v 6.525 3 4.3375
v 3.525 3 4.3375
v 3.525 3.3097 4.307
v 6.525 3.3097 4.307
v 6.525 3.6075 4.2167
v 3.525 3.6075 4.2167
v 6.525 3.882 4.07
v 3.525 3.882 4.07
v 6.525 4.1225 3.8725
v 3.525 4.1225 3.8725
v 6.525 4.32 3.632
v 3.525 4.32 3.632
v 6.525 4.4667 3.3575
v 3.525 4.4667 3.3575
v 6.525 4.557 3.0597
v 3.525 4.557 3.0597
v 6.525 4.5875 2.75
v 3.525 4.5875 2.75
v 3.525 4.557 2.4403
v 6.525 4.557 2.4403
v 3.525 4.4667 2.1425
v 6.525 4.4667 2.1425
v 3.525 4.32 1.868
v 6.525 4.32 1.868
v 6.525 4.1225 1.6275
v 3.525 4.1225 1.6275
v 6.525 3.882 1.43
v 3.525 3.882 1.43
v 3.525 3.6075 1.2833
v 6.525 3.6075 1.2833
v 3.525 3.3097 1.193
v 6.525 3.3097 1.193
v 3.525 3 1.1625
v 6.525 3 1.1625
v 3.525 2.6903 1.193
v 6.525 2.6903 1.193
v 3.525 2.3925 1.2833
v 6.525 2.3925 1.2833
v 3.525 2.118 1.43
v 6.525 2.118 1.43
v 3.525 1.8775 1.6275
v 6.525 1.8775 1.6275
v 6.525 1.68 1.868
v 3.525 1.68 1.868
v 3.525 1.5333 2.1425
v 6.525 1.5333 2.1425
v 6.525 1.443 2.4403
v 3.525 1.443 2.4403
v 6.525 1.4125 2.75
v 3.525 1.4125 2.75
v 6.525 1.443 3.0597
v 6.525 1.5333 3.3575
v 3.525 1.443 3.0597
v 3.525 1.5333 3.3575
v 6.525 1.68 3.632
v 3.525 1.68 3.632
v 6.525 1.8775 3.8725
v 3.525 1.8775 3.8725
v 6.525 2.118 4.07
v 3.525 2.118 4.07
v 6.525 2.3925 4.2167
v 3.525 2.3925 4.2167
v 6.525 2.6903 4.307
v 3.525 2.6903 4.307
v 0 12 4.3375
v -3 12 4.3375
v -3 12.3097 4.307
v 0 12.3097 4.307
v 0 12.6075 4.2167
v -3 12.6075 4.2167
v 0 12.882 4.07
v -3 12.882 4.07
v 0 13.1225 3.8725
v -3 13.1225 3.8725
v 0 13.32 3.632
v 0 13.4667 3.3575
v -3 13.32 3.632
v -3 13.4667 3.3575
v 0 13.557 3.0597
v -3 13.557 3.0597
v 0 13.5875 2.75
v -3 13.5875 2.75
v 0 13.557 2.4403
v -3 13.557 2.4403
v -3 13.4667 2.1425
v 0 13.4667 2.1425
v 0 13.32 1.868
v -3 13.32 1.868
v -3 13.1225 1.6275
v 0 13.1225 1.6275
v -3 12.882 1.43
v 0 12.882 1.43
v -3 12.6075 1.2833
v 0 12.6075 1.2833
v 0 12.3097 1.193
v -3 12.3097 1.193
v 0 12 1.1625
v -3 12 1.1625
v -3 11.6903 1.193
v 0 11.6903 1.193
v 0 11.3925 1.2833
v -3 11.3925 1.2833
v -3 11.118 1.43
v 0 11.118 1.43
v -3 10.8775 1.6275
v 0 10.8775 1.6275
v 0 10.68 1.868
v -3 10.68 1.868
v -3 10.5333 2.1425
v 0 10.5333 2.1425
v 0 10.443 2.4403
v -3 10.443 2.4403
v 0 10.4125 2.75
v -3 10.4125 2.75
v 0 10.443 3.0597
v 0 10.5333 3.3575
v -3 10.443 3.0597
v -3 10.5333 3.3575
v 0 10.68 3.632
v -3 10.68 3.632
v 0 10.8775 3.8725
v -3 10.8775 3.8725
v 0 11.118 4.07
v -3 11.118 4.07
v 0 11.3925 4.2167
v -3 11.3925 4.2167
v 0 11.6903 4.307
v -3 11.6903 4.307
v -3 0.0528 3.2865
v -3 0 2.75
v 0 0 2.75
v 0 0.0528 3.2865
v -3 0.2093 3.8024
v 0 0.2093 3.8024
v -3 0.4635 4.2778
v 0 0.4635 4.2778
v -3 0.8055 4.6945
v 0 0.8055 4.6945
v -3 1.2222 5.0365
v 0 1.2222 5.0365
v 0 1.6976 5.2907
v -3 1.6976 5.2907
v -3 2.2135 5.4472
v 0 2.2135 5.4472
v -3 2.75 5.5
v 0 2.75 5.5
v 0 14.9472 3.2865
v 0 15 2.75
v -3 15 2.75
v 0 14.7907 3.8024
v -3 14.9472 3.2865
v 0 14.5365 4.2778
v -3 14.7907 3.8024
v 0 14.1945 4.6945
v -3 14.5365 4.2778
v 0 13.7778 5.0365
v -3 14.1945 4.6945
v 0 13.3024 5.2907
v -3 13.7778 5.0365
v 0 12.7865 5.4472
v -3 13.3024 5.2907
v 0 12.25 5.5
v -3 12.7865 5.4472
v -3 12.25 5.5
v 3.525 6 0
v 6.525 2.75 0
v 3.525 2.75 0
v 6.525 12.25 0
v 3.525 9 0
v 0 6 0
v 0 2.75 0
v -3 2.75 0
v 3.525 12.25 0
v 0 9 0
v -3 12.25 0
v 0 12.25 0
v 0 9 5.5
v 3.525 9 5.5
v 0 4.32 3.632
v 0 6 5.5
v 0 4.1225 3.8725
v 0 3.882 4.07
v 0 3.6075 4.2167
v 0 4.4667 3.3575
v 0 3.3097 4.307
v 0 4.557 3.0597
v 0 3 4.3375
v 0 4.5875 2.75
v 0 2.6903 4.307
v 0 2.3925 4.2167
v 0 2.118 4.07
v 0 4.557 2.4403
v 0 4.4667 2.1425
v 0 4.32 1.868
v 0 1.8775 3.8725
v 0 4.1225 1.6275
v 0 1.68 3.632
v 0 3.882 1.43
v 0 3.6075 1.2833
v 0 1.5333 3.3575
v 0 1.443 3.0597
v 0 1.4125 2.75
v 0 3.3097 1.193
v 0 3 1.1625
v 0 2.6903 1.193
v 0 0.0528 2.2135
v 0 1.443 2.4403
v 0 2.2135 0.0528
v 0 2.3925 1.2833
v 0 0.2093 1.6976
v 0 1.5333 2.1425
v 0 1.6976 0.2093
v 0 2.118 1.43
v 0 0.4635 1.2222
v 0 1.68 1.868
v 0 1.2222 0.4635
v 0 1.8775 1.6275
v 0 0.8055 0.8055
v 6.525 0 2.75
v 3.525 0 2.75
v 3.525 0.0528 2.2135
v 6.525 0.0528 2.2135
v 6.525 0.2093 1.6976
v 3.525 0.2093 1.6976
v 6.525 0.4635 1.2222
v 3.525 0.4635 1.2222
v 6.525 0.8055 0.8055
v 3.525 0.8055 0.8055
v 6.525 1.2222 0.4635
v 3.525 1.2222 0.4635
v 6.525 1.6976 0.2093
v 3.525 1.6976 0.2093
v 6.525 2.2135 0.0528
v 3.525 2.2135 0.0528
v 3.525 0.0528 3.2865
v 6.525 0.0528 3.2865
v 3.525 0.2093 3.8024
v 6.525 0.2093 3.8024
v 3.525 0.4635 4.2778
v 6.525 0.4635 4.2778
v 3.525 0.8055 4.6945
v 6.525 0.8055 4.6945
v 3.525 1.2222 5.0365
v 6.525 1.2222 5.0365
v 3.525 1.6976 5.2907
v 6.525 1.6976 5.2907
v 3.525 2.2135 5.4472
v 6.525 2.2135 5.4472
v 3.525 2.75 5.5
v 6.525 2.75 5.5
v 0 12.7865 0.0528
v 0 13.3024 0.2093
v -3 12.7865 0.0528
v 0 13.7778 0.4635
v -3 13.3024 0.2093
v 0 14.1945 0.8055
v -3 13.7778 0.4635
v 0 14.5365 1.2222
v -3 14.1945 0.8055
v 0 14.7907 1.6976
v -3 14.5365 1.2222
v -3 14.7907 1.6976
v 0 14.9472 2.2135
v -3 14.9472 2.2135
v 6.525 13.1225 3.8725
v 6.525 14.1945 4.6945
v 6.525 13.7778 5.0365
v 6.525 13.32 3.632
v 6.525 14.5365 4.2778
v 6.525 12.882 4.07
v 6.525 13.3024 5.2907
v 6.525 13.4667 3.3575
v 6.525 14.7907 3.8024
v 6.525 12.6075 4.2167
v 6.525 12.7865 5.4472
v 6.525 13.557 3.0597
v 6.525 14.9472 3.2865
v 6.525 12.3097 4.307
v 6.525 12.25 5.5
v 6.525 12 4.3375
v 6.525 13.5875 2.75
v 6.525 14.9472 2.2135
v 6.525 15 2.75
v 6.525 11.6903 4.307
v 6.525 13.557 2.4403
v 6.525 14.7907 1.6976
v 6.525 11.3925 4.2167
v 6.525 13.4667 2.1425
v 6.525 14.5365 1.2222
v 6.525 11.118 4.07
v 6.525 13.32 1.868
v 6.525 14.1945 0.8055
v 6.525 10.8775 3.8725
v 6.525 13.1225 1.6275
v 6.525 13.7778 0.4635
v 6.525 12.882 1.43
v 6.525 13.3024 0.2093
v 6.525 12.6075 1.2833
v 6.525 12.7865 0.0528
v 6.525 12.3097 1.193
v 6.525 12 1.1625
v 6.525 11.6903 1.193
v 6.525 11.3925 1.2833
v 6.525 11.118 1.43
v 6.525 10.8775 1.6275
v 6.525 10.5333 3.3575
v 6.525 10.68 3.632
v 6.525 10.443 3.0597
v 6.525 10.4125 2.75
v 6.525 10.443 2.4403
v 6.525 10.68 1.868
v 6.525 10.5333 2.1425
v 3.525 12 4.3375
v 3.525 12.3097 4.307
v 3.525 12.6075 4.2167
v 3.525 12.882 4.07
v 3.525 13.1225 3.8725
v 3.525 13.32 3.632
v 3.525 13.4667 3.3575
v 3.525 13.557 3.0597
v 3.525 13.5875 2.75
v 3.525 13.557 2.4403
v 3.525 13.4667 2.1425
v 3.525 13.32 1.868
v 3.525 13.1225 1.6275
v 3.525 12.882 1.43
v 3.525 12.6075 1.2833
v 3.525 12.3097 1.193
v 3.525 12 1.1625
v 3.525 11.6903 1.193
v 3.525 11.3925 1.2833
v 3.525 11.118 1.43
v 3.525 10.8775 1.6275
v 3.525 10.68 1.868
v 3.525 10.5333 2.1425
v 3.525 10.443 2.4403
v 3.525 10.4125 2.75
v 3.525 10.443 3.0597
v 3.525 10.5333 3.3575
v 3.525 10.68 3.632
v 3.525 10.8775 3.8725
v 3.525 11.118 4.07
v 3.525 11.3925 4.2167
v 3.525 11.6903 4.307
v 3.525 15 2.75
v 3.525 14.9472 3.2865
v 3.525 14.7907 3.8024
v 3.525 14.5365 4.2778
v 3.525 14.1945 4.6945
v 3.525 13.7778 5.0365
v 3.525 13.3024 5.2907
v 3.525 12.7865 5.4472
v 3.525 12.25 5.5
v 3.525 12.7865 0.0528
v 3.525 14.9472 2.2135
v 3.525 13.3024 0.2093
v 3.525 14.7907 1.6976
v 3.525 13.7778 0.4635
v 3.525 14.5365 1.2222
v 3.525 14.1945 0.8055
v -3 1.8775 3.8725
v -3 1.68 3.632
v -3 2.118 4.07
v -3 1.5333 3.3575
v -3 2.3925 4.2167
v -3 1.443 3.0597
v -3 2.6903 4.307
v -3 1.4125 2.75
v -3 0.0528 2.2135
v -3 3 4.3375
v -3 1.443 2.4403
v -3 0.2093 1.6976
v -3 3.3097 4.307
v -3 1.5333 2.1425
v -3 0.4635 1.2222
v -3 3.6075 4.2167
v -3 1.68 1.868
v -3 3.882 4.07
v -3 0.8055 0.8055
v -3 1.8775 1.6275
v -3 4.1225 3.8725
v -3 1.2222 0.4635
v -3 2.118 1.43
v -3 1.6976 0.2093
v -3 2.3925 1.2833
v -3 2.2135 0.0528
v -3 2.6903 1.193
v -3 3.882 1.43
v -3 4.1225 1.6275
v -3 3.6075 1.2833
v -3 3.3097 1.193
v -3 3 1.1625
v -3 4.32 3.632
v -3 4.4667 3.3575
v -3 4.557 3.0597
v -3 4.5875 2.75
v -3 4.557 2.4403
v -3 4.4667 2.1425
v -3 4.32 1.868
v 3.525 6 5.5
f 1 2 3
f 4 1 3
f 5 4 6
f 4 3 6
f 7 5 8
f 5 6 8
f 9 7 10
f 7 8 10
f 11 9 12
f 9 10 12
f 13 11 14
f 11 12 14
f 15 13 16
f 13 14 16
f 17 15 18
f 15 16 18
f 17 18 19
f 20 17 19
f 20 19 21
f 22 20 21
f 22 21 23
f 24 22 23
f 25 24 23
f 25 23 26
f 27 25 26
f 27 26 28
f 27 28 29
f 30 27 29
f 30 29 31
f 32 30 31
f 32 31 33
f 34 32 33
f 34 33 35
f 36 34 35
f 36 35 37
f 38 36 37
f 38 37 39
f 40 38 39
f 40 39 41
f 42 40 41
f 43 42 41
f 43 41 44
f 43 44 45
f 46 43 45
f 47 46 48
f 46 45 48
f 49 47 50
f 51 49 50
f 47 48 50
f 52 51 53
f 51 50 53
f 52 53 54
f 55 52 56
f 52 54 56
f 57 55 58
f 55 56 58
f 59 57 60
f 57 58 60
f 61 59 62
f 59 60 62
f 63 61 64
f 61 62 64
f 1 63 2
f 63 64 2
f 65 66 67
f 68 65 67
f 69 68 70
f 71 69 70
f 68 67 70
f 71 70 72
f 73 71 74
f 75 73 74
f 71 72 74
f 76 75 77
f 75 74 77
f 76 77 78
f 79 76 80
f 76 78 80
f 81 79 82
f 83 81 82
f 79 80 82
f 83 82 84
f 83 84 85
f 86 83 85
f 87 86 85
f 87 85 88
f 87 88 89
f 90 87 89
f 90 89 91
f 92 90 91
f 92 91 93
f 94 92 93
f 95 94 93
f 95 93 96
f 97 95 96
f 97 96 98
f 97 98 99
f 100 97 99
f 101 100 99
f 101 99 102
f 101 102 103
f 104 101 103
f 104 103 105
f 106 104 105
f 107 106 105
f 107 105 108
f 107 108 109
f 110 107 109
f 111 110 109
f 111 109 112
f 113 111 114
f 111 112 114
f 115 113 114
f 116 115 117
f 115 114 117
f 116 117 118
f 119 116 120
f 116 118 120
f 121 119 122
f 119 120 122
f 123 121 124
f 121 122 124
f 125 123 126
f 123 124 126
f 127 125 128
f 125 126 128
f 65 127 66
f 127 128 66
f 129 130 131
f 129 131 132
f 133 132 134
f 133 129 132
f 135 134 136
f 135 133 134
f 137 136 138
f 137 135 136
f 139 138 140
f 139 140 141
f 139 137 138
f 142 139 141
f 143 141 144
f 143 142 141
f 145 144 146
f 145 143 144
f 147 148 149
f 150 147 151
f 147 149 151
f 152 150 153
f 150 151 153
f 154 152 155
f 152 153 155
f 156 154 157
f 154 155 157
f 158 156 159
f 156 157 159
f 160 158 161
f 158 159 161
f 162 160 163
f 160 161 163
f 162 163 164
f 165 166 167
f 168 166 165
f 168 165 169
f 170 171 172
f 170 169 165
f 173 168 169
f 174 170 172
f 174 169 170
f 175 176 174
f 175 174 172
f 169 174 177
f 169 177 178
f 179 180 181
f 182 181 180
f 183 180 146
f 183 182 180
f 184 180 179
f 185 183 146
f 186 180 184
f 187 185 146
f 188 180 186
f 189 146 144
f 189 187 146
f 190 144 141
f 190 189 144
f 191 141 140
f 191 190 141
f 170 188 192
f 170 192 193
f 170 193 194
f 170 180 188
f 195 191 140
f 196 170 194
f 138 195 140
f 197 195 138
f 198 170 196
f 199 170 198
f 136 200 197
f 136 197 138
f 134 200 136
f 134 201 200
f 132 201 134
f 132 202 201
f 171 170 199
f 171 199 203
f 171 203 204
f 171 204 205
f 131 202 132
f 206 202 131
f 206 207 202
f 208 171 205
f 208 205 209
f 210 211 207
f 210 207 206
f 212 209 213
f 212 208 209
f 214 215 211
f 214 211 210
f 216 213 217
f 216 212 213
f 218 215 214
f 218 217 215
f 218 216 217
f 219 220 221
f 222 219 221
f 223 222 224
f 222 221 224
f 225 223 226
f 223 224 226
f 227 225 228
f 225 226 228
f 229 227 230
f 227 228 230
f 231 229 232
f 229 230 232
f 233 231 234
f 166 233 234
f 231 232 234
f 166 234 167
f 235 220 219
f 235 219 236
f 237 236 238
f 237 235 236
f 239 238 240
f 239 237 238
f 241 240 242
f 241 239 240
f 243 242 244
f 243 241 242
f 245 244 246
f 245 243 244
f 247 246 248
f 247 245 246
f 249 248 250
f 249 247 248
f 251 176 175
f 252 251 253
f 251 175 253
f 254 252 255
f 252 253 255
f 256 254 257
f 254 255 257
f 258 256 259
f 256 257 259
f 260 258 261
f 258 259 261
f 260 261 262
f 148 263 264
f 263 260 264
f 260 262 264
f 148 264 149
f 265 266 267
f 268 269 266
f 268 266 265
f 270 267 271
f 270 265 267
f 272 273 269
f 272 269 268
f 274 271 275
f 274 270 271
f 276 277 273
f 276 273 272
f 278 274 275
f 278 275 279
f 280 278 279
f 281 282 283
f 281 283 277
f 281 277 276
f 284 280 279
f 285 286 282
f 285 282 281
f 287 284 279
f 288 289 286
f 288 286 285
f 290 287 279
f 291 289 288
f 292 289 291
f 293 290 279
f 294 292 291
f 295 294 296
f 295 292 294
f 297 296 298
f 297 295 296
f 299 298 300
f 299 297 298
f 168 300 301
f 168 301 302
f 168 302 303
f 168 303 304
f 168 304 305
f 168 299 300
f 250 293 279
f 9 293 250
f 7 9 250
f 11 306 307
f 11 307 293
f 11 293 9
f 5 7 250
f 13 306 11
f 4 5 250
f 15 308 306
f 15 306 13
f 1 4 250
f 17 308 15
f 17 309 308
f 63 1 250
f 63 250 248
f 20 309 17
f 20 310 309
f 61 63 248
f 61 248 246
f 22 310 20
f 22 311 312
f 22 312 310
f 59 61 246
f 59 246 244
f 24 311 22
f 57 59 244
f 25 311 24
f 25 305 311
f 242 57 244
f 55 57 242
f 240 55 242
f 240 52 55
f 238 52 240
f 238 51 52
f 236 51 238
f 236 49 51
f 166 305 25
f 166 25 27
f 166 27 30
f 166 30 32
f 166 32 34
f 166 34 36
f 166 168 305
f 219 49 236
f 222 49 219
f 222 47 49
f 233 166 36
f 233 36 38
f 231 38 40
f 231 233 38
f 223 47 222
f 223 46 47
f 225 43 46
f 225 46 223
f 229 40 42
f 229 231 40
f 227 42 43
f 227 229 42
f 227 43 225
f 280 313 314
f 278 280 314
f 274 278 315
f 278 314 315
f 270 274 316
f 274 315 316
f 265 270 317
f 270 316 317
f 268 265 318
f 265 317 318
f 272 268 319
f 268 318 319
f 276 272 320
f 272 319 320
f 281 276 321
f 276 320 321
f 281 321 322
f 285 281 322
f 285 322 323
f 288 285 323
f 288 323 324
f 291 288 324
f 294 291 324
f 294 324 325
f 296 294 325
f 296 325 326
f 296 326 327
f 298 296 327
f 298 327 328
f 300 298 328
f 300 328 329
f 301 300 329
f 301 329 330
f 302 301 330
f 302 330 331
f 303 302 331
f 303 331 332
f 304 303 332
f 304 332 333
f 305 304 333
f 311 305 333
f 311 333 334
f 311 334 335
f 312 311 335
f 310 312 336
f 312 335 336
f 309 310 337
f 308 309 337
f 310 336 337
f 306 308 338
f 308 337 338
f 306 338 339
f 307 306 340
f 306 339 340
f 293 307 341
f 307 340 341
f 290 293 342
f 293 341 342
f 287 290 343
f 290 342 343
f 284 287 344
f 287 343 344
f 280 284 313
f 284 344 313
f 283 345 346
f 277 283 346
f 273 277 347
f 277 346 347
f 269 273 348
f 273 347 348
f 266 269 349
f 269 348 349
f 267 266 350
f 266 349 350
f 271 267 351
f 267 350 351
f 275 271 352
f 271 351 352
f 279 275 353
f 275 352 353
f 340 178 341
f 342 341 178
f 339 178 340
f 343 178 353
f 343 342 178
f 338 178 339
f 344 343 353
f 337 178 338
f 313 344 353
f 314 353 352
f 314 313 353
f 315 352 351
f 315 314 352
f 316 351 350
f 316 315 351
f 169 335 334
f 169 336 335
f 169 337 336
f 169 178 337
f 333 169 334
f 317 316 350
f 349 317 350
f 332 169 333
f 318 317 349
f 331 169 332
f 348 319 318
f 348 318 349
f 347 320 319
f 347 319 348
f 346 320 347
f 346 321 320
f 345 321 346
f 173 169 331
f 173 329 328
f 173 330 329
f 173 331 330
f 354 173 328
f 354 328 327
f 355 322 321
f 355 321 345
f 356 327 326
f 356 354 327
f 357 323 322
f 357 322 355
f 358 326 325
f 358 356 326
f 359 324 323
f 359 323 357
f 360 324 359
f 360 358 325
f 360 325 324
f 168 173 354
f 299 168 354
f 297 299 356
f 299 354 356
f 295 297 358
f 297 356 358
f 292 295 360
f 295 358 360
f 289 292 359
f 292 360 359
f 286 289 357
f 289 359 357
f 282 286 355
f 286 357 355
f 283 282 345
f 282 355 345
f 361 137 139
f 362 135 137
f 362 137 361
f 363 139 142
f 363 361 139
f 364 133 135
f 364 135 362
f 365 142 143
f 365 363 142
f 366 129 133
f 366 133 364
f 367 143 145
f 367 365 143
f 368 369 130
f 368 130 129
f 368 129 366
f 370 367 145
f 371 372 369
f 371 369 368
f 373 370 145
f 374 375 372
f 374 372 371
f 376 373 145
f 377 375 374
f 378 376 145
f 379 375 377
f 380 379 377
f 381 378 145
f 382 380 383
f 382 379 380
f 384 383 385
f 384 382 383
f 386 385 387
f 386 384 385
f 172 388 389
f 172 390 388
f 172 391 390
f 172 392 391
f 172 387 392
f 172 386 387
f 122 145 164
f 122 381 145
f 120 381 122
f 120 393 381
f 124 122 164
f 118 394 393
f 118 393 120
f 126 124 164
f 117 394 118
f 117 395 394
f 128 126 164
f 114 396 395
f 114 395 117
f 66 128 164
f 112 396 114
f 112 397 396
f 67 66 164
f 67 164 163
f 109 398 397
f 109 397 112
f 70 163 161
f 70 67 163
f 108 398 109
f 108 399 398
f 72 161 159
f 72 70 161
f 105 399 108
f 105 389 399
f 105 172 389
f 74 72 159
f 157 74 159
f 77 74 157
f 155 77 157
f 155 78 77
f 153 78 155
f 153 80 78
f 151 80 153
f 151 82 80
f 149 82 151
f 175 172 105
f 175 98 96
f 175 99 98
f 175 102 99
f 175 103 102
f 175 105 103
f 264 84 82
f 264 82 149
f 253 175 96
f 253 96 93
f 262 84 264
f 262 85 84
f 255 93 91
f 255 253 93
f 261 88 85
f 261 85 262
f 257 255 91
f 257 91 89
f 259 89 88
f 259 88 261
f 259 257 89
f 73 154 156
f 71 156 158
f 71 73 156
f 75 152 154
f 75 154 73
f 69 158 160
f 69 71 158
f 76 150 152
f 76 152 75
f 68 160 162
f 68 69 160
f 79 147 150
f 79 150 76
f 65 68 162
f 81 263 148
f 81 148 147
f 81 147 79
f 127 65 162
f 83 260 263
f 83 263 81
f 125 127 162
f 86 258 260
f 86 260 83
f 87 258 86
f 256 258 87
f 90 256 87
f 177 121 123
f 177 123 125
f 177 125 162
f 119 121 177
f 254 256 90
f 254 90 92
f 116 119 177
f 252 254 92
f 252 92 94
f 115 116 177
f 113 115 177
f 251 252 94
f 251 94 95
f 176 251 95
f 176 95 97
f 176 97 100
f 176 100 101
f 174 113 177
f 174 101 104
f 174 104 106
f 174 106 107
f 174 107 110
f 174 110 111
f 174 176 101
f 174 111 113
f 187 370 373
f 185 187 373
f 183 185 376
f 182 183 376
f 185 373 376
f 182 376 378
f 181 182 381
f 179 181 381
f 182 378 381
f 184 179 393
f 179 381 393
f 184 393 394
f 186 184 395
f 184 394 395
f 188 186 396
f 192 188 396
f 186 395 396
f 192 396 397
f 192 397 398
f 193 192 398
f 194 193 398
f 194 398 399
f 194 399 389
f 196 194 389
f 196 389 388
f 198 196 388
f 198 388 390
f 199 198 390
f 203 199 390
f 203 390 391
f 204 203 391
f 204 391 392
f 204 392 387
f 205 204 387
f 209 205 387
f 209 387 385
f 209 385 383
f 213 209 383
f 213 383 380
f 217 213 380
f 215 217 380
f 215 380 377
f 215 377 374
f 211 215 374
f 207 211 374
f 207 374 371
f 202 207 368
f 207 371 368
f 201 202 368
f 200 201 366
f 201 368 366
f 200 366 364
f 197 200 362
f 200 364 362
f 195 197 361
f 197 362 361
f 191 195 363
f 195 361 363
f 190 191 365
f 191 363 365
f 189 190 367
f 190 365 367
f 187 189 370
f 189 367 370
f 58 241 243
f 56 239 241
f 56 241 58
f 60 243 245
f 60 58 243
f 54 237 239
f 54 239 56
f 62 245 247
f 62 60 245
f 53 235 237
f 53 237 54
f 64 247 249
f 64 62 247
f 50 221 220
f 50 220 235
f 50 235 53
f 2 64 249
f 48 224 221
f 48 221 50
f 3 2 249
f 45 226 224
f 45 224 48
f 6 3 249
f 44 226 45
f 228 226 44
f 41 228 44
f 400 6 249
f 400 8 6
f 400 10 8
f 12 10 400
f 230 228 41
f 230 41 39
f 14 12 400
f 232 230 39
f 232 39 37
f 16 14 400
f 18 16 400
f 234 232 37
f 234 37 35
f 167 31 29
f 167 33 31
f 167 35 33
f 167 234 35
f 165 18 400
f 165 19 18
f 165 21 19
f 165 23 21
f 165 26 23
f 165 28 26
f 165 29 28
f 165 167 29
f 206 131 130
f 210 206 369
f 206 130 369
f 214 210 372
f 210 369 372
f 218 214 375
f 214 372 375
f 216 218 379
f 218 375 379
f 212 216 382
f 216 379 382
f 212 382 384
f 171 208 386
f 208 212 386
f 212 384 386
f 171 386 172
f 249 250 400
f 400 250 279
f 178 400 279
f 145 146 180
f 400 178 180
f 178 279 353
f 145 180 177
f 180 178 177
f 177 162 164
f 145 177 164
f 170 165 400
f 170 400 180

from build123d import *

# Parameters (mm, degrees)
BOSS_EXTRUDE1_DEPTH = 5.5
SKETCH3_R           = 1.5875
CUT_EXTRUDE1_DEPTH  = 9.525


with BuildPart() as part:
    # Sketch1 → Boss-Extrude1 (new body)
    with BuildSketch(Plane.XY):
        Polygon((0, 0), (-3, 0), (-3, 15), (0, 15), (0, 9), (3.525, 9), (3.525, 15), (6.525, 15), (6.525, 0), (3.525, 0), (3.525, 6), (0, 6), align=None)
    extrude(amount=BOSS_EXTRUDE1_DEPTH)

    # Sketch3 → Cut-Extrude1 (cut)
    with BuildSketch(Plane.ZY.offset(3)):
        with BuildLine():
            Line((5.5, 15), (2.75, 15))
            ThreePointArc((2.75, 15), (4.694543648, 14.194543648), (5.5, 12.25))
            Line((5.5, 12.25), (5.5, 15))
        make_face()
        with BuildLine():
            Line((0, 15), (0, 12.25))
            ThreePointArc((0, 12.25), (0.805456352, 14.194543648), (2.75, 15))
            Line((2.75, 15), (0, 15))
        make_face()
        with Locations((2.75, 12)):
            Circle(SKETCH3_R)
        with Locations((2.75, 3)):
            Circle(SKETCH3_R)
        with BuildLine():
            ThreePointArc((2.75, 0), (0.805456352, 0.805456352), (0, 2.75))
            Line((0, 2.75), (0, 0))
            Line((0, 0), (2.75, 0))
        make_face()
        with BuildLine():
            ThreePointArc((2.75, 0), (4.694543648, 0.805456352), (5.5, 2.75))
            Line((5.5, 2.75), (5.5, 0))
            Line((5.5, 0), (2.75, 0))
        make_face()
    extrude(amount=-CUT_EXTRUDE1_DEPTH, mode=Mode.SUBTRACT)


solid = part.part
